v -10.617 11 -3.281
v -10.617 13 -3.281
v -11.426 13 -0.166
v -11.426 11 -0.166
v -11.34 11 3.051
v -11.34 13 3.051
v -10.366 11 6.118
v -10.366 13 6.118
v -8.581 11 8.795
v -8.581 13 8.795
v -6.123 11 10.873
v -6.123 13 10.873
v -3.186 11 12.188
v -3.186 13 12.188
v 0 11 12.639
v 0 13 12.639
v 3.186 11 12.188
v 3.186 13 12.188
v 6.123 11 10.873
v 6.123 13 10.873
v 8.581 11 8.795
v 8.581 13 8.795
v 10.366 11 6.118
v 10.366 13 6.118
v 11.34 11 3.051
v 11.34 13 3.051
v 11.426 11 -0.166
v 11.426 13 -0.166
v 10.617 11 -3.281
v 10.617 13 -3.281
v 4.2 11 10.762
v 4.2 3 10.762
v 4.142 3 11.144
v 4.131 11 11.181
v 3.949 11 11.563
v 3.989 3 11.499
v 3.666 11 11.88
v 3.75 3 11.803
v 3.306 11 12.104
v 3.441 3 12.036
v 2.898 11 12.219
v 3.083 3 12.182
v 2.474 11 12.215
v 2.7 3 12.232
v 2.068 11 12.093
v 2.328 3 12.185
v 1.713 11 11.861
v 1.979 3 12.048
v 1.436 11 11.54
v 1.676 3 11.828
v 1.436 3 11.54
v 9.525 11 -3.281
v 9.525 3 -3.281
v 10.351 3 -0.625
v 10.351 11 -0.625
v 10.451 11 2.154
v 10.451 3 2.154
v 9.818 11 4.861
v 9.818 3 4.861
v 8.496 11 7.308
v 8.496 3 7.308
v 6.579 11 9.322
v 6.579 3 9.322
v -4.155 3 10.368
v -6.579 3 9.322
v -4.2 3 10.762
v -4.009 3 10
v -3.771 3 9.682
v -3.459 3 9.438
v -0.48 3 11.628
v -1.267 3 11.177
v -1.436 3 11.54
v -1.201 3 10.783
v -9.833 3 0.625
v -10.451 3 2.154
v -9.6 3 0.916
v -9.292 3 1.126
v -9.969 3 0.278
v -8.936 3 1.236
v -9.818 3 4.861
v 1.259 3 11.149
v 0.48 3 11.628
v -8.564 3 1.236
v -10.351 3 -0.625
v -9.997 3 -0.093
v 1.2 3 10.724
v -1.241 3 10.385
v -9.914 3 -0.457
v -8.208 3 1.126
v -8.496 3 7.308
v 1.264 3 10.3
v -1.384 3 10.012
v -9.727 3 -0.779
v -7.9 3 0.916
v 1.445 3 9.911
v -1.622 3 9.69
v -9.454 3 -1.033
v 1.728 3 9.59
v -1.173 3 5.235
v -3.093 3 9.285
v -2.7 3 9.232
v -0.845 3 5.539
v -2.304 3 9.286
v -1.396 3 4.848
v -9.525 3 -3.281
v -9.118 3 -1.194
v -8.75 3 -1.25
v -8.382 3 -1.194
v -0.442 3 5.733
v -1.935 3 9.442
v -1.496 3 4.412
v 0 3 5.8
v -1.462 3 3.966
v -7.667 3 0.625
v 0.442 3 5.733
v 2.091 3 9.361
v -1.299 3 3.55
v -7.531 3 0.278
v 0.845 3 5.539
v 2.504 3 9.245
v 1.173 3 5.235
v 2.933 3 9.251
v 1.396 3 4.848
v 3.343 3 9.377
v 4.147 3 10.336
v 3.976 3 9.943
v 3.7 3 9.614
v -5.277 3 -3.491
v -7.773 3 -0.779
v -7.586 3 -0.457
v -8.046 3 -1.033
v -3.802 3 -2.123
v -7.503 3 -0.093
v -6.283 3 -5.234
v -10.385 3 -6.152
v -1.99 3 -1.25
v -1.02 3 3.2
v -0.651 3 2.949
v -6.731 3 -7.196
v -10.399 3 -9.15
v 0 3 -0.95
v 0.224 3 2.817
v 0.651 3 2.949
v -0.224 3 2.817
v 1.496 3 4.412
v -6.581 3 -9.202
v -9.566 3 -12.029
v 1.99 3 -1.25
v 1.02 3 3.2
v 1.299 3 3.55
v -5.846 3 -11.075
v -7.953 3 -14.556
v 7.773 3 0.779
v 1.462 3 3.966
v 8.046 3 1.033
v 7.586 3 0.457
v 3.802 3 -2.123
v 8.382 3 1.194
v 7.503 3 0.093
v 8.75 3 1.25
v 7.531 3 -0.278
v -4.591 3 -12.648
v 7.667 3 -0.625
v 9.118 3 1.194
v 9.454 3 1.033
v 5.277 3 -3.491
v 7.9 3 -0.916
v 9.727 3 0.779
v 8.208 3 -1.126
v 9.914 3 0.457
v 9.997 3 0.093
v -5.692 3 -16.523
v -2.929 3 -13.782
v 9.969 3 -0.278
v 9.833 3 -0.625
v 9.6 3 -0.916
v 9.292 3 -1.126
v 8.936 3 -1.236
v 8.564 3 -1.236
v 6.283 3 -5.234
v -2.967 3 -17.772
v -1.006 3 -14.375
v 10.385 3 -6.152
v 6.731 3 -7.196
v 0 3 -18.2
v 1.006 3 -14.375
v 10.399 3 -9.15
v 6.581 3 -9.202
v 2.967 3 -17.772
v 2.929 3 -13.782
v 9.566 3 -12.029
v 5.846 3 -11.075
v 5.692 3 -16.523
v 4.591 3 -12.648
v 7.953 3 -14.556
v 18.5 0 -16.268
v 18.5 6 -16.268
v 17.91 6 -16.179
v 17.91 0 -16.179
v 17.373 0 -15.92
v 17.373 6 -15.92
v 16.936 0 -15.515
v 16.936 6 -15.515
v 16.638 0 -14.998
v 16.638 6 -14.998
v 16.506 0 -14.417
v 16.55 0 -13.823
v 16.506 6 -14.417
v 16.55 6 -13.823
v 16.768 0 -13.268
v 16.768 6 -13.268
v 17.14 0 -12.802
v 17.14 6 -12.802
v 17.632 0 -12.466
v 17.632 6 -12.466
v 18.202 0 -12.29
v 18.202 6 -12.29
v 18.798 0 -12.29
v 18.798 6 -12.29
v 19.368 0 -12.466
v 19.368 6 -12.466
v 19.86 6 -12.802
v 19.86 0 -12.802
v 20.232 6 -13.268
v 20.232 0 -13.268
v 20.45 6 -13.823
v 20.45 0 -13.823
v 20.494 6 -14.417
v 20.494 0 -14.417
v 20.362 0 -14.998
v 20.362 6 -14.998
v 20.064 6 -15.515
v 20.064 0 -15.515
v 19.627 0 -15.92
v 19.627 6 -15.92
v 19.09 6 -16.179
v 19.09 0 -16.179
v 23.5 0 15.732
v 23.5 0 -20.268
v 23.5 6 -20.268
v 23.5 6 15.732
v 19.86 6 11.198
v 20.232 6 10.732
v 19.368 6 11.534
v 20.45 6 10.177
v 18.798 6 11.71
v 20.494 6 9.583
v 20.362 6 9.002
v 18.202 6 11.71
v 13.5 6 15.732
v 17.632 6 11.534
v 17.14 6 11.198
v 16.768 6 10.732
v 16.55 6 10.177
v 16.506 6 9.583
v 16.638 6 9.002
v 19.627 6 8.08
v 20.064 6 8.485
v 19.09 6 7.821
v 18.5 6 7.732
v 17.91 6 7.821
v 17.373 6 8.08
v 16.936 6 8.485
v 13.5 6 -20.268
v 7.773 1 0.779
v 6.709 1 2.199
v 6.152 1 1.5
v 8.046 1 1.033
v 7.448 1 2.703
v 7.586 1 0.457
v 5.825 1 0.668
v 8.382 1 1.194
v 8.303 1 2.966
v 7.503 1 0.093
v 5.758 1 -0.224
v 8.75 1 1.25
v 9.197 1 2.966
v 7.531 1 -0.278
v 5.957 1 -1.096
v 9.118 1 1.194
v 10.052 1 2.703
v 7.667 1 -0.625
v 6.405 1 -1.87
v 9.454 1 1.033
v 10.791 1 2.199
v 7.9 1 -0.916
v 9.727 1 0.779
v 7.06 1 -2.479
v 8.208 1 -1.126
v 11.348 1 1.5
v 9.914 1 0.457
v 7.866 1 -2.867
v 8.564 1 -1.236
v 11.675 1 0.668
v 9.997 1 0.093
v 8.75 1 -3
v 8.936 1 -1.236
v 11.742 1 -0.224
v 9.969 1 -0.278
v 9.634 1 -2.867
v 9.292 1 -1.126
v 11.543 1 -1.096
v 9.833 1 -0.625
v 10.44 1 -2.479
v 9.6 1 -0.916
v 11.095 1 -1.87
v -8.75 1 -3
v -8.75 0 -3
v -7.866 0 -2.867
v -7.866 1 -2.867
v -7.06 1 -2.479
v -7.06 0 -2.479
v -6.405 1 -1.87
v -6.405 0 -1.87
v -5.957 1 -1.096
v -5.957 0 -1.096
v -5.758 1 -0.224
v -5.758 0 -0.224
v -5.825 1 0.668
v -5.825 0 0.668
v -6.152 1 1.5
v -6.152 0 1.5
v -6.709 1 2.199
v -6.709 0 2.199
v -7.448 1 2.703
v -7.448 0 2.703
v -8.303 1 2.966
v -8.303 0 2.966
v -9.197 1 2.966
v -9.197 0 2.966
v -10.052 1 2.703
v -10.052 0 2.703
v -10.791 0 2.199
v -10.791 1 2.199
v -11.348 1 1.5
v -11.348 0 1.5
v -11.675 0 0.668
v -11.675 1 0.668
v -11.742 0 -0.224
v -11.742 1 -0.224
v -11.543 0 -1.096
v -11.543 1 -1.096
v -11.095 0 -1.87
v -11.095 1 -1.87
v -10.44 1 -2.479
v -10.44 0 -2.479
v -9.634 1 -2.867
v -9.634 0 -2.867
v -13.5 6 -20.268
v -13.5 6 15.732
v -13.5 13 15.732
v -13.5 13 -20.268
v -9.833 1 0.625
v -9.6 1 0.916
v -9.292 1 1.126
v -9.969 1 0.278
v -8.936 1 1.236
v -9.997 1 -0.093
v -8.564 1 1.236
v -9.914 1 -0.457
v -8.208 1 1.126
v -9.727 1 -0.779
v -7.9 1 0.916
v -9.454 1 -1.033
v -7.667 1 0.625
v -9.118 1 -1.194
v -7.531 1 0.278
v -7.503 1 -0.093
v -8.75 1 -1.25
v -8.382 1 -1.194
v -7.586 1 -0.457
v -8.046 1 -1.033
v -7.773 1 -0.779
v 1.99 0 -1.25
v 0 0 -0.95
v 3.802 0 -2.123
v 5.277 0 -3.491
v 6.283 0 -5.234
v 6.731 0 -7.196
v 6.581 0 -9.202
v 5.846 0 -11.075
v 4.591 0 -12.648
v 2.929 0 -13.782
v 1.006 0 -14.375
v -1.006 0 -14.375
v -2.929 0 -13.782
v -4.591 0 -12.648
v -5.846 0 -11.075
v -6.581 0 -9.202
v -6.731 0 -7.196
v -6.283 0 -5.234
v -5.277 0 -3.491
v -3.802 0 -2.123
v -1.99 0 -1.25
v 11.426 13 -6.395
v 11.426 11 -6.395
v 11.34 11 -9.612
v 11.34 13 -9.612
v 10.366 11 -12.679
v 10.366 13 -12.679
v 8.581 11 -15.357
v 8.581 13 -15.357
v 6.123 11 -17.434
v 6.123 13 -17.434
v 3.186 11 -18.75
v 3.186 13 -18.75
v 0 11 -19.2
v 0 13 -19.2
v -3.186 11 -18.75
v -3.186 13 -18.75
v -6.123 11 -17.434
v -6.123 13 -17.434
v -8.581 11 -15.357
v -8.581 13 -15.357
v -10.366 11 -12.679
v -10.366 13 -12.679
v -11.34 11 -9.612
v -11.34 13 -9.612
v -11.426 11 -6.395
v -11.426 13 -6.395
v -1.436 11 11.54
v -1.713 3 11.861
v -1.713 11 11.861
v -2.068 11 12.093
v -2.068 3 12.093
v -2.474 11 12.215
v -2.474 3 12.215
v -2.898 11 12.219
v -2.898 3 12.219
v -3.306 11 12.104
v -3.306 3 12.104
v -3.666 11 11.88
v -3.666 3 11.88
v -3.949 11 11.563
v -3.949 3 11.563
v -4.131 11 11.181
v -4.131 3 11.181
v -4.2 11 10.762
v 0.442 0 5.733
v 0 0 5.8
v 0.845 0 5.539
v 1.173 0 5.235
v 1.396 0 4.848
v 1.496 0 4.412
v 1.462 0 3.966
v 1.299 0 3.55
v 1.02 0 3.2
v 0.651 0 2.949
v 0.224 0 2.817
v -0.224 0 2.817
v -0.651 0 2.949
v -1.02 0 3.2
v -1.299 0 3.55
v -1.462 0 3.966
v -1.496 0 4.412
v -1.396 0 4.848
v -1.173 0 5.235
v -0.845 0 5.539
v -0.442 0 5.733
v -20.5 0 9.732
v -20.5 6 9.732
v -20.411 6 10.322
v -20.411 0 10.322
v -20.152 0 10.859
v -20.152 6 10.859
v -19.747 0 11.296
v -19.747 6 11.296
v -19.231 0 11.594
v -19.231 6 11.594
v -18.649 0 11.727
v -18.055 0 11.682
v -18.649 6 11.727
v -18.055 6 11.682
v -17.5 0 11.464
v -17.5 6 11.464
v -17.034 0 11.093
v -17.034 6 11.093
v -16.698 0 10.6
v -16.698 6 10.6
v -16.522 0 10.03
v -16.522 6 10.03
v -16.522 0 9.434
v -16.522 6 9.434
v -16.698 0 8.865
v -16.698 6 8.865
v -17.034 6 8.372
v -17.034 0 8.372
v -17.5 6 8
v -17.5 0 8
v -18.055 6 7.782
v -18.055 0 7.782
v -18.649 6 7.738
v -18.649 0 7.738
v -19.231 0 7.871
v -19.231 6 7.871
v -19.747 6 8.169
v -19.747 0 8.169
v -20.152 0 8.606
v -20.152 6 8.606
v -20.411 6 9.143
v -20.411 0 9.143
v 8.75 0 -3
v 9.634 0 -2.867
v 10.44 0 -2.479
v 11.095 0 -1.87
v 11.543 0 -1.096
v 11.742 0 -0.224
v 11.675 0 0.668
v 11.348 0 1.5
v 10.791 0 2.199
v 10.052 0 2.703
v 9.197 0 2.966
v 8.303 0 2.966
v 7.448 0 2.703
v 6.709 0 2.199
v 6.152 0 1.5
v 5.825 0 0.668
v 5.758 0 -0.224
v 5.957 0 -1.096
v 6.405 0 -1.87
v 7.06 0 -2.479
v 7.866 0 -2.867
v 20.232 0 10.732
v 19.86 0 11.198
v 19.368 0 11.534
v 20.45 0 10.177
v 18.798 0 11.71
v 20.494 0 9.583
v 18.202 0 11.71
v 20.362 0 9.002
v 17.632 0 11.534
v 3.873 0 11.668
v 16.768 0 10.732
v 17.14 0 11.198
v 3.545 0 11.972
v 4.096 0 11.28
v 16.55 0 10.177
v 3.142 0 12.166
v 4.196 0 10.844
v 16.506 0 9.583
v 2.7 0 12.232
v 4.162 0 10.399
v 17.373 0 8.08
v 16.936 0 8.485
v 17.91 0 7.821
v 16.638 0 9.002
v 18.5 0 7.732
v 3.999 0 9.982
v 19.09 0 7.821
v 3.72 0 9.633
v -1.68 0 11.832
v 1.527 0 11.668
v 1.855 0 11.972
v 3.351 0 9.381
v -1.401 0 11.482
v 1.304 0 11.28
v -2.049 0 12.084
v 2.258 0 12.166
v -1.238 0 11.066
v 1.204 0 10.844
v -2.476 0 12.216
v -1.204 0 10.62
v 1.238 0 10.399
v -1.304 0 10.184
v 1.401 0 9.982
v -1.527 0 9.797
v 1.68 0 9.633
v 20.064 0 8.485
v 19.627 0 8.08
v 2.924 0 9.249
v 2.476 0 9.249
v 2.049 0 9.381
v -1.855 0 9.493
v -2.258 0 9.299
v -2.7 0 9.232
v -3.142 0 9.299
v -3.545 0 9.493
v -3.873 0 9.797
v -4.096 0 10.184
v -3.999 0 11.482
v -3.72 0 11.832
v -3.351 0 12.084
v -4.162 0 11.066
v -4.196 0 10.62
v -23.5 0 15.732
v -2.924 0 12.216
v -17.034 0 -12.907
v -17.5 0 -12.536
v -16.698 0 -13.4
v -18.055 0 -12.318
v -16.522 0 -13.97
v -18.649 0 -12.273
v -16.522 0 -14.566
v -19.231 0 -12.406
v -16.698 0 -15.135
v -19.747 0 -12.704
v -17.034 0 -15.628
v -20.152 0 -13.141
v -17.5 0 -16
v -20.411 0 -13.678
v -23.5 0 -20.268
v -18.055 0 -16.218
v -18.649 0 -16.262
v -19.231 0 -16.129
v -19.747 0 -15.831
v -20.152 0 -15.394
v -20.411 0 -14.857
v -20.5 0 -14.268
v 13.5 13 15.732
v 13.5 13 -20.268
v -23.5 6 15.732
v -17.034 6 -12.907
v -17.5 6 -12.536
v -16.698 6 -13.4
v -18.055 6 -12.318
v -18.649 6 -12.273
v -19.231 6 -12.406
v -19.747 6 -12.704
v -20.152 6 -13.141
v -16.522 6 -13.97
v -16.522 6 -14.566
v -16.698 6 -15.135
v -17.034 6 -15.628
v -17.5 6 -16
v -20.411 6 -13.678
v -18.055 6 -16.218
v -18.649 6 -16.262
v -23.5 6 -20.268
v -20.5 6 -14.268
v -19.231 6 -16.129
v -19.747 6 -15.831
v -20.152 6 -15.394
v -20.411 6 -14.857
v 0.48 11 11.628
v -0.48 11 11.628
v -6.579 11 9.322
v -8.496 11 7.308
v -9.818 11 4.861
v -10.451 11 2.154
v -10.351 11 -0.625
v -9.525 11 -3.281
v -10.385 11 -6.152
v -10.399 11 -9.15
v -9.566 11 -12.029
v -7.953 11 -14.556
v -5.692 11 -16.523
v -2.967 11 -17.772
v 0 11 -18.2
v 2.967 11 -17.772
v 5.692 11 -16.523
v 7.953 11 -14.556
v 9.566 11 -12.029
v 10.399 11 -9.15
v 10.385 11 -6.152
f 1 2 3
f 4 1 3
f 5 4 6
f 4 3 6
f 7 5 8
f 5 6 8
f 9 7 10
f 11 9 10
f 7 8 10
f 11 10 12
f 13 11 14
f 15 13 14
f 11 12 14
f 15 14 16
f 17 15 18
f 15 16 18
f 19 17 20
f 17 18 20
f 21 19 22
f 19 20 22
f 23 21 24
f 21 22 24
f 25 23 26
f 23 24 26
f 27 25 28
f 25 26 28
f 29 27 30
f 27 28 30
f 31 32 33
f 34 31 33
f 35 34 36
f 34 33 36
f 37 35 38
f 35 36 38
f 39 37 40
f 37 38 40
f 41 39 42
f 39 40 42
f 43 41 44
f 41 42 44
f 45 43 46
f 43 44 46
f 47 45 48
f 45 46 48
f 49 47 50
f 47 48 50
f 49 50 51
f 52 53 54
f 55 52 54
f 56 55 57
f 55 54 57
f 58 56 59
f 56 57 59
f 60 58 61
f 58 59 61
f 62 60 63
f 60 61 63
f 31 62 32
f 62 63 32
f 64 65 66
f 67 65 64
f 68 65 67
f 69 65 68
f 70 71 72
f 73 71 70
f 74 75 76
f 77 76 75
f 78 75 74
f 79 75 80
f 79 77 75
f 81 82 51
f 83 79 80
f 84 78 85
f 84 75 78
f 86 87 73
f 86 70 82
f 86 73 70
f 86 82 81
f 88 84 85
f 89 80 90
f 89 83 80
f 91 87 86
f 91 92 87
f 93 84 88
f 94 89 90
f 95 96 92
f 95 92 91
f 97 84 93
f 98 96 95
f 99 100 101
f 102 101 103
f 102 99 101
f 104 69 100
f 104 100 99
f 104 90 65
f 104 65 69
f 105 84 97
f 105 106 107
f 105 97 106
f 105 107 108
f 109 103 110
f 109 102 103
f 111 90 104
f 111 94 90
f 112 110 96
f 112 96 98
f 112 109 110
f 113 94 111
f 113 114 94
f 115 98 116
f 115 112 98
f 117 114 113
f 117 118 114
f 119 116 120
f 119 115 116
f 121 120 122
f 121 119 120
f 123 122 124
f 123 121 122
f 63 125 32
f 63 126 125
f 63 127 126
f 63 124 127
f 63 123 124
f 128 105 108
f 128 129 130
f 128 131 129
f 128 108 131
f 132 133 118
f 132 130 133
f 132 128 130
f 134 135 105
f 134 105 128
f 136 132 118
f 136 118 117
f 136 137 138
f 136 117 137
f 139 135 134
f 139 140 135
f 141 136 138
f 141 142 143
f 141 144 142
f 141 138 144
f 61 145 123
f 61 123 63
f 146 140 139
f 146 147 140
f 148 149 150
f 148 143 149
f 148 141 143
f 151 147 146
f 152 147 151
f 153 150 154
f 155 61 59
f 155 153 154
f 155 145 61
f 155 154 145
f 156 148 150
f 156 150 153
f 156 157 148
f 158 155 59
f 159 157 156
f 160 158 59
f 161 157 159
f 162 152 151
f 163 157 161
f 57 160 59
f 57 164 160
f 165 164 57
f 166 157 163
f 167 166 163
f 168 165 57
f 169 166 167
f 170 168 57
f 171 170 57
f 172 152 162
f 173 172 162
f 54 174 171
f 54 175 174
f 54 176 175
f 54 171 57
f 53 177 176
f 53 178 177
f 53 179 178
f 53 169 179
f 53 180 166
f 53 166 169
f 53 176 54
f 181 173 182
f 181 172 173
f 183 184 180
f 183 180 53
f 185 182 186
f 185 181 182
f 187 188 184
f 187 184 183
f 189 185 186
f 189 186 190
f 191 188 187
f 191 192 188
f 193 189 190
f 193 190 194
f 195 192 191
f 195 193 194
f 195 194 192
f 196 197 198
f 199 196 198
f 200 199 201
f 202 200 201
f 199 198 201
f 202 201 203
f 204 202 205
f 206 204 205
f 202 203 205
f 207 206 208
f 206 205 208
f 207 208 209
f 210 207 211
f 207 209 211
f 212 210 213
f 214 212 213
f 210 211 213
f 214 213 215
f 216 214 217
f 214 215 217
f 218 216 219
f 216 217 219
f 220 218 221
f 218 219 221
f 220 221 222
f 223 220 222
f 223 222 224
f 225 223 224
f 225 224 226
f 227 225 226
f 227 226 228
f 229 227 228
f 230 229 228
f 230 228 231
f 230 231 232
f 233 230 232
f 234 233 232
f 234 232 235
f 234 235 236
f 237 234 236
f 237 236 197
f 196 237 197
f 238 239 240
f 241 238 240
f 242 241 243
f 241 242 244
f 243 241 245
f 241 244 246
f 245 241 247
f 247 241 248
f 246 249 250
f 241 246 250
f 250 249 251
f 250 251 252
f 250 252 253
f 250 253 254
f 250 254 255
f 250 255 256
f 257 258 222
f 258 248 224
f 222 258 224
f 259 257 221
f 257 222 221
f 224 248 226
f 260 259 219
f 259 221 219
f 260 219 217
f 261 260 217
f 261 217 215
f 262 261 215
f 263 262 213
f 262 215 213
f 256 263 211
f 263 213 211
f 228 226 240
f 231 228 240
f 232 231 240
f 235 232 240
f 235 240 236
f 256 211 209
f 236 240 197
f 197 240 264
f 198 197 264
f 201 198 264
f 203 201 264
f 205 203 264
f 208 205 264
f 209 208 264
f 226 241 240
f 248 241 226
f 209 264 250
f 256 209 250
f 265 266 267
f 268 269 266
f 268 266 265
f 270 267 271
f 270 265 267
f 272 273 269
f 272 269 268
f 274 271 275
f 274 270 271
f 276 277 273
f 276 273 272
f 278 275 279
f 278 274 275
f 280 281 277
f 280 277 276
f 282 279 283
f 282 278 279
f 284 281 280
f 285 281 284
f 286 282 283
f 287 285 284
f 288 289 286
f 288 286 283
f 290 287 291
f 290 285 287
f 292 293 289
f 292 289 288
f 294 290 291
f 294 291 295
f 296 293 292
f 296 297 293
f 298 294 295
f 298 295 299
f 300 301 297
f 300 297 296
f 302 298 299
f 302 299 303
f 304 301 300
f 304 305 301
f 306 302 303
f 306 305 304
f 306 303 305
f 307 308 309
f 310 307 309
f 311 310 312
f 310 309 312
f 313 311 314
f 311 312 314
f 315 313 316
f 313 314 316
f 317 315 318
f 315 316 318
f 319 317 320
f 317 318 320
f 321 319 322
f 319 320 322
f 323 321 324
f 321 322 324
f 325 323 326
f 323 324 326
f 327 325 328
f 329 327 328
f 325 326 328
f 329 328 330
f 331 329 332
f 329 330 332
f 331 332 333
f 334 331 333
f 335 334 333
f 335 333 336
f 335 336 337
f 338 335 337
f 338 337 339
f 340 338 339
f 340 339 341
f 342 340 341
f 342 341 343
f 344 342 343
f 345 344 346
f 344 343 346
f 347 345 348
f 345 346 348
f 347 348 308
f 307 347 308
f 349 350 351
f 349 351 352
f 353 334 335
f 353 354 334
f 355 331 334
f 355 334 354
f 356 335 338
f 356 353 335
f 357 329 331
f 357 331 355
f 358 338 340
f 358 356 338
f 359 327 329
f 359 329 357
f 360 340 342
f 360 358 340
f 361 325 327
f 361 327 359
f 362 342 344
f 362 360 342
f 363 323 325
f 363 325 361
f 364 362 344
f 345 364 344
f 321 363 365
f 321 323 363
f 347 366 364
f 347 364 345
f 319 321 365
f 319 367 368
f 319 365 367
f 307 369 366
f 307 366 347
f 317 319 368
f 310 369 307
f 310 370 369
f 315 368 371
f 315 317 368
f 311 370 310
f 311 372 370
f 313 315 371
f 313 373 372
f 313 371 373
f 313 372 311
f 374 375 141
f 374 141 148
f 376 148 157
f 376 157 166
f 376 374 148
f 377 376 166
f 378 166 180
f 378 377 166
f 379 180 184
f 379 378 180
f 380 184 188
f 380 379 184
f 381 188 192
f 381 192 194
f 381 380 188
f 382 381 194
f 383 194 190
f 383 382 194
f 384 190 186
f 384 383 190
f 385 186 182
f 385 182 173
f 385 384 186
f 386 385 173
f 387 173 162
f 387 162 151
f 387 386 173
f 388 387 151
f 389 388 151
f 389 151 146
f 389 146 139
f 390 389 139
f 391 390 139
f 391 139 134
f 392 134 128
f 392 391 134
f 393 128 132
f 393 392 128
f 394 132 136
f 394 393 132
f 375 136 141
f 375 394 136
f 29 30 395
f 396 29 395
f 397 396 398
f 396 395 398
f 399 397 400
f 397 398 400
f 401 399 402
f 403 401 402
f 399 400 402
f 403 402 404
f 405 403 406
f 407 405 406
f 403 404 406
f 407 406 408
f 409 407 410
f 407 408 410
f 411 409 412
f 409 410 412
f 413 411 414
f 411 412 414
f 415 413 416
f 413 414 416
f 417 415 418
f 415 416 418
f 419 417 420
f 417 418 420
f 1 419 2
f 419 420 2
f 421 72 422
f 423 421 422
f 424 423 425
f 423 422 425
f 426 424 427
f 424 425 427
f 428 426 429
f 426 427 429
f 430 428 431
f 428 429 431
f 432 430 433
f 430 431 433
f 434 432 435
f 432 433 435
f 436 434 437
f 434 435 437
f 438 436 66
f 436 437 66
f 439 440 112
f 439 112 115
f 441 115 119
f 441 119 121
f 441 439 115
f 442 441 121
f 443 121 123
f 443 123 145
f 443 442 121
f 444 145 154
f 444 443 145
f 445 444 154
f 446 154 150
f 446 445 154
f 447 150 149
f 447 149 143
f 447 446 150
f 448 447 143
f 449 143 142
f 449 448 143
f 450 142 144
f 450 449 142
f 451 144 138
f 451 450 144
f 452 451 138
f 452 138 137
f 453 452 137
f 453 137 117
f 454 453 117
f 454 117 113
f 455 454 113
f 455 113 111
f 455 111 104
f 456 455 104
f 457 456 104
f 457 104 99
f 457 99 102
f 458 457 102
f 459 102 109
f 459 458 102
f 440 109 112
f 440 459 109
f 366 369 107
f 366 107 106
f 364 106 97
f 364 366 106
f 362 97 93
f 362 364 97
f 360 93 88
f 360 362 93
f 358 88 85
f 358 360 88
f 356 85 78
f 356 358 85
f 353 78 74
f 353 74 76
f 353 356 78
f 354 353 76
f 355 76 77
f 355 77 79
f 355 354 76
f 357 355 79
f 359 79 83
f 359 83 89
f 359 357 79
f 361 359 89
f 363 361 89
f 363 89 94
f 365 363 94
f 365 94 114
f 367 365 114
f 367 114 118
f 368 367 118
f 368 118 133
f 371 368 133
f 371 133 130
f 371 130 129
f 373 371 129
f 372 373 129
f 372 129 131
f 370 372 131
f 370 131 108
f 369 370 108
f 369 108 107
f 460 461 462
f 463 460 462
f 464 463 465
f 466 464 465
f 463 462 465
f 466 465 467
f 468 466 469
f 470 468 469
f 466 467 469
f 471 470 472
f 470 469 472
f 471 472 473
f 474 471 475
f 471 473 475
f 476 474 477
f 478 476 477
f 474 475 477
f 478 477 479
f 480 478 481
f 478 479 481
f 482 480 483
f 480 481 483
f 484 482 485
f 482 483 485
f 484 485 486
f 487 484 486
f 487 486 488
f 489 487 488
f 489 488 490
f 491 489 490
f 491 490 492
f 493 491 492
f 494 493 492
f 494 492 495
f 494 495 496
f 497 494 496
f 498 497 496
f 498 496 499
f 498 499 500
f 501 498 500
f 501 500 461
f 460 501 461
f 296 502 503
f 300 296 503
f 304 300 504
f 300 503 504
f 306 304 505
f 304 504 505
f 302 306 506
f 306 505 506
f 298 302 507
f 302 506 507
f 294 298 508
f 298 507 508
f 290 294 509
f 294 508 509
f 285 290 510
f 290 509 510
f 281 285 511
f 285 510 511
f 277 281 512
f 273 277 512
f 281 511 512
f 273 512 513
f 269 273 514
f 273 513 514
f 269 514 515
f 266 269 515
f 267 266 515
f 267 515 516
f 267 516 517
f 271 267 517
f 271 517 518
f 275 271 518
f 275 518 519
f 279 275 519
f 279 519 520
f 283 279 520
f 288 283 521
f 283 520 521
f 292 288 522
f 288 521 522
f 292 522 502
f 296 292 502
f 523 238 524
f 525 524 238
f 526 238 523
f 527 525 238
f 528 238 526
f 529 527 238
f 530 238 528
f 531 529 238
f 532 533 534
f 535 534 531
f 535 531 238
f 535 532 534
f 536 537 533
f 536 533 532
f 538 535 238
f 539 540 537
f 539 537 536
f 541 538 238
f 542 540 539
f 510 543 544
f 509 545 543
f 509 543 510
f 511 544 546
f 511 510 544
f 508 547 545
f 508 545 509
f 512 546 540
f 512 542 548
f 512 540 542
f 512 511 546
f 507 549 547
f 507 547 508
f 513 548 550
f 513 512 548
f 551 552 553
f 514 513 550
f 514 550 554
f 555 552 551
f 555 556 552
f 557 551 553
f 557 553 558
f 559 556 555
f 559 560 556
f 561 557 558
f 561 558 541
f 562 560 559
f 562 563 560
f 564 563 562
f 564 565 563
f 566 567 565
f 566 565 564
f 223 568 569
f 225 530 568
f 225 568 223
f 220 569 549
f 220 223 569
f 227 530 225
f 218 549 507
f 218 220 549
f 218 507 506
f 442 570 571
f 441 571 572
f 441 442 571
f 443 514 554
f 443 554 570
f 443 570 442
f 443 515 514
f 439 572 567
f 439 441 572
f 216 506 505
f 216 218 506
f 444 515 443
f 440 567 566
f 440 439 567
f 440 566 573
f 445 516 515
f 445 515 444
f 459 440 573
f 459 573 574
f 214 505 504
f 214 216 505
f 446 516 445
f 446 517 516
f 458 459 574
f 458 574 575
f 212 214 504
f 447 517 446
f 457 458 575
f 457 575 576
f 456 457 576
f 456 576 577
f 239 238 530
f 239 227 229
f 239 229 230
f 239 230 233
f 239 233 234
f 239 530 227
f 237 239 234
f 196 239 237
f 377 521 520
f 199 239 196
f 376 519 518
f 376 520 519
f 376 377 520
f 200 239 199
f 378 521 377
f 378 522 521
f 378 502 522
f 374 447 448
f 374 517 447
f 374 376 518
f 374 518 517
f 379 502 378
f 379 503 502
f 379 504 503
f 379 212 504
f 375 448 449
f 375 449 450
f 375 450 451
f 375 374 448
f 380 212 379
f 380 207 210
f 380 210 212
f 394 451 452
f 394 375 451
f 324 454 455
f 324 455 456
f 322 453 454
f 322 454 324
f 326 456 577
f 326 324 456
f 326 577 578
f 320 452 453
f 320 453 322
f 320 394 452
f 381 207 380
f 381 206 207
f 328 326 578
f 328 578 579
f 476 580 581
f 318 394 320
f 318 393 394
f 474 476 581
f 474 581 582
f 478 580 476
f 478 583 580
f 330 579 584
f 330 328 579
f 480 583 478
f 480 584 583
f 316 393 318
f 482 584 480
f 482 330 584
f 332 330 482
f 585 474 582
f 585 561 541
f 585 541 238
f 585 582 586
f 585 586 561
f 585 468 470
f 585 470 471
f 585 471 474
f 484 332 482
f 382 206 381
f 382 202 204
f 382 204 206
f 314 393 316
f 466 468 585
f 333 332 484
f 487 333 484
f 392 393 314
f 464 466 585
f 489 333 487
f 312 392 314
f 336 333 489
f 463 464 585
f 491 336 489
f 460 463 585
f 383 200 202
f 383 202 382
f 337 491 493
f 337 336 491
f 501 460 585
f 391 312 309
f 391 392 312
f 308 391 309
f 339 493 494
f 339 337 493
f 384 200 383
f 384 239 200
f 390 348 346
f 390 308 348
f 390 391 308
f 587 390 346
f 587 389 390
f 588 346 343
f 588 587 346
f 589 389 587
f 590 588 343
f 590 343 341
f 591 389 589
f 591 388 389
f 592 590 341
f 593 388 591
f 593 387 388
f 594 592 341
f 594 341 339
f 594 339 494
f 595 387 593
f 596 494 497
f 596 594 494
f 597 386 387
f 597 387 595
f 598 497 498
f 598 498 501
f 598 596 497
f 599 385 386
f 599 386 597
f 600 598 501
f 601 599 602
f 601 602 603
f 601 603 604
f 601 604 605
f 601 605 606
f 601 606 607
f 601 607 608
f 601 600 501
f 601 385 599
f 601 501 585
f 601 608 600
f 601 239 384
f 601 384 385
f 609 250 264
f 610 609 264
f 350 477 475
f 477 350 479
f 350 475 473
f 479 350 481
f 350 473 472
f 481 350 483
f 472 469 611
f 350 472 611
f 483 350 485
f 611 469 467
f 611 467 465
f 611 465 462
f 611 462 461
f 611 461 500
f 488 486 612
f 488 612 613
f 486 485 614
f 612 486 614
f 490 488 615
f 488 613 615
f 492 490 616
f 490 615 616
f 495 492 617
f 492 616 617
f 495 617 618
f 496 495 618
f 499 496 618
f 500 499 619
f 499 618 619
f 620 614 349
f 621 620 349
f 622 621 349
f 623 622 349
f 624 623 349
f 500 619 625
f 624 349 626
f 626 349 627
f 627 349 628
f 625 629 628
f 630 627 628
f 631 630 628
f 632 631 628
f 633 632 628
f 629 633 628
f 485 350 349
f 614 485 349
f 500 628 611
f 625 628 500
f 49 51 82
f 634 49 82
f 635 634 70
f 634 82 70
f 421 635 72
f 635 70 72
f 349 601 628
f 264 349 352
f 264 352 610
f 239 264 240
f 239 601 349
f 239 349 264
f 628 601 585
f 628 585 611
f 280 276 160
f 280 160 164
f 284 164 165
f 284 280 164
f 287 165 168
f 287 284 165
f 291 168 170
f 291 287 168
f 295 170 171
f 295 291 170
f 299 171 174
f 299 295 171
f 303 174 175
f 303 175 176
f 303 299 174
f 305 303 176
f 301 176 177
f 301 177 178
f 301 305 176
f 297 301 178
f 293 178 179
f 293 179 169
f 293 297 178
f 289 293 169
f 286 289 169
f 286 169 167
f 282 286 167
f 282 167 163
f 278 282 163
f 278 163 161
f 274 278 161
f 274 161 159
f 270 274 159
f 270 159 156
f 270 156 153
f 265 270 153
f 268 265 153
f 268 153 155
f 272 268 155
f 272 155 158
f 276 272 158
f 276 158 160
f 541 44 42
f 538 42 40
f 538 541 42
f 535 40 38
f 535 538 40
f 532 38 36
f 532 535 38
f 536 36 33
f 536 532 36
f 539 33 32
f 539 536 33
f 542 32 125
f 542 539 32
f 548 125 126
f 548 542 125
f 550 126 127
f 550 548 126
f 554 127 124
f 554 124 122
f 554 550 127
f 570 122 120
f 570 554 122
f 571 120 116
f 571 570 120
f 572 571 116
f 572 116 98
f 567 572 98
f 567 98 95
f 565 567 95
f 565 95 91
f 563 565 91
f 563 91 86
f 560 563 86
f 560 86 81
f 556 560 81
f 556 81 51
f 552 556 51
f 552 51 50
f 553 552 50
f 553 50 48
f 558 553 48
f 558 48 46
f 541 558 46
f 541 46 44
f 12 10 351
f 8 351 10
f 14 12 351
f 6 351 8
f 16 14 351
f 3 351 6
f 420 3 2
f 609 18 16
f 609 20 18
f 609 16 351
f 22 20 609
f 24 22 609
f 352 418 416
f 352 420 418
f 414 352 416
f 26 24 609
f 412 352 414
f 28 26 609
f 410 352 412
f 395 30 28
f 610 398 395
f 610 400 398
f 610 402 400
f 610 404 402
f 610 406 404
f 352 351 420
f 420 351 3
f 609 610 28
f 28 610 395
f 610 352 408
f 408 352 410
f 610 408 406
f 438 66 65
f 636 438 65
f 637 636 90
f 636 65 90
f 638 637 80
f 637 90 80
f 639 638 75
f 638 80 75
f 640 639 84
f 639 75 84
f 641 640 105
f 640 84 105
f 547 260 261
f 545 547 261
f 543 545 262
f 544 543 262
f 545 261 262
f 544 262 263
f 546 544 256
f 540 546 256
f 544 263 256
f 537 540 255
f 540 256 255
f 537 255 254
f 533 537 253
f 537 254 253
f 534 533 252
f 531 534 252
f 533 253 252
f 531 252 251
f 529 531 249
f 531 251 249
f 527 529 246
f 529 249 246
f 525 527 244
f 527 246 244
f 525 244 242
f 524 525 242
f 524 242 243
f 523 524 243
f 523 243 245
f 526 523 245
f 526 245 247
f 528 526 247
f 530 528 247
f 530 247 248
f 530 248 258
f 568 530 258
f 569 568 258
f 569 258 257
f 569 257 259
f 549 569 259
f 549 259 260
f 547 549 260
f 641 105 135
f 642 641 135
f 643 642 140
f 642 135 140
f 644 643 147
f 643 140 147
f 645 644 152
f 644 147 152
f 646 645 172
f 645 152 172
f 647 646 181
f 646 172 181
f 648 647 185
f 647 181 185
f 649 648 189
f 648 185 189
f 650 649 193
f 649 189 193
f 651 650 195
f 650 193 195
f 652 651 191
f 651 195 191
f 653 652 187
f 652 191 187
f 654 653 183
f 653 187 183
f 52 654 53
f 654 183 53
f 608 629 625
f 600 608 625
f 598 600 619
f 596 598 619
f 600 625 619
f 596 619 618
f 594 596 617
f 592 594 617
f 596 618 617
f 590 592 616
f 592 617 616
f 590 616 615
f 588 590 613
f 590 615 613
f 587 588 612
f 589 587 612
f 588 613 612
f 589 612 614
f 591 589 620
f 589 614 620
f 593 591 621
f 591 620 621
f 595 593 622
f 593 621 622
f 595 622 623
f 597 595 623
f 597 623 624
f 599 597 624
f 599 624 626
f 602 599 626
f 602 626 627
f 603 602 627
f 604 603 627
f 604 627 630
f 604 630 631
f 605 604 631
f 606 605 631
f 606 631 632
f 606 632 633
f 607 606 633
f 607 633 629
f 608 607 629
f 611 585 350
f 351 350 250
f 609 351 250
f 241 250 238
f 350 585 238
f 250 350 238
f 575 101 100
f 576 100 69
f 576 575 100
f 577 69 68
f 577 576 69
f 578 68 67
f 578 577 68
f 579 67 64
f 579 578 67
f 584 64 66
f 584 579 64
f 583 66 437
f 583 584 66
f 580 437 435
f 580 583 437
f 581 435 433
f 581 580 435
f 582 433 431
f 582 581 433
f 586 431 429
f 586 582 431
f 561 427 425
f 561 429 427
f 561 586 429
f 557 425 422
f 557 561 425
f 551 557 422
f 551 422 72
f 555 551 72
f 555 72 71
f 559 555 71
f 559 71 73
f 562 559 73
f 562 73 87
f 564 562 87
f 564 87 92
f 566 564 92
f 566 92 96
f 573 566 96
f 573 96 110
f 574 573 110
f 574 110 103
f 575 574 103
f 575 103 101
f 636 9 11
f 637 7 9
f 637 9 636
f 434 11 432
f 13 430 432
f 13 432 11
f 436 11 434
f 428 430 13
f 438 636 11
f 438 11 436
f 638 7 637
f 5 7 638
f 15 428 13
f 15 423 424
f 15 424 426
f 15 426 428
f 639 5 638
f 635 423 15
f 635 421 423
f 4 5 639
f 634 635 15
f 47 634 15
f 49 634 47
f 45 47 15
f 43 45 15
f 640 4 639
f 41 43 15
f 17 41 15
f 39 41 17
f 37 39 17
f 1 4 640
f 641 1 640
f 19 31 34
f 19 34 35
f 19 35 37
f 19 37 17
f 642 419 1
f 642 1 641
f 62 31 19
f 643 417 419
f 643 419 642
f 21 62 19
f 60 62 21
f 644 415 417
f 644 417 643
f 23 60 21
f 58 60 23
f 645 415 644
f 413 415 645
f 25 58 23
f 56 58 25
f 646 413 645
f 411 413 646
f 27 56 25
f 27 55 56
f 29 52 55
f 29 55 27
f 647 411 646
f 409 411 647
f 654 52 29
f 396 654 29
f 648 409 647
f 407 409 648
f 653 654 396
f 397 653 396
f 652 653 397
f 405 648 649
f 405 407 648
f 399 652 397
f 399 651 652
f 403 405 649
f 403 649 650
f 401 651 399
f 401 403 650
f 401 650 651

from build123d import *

# Parameters (mm, degrees)
SKETCH_1_W          = 27
SKETCH_1_H          = 36
SKETCH_1_R          = 6.75
SKETCH_1_R_2        = 1.5
SKETCH_1_R_3        = 1.25
EXTRUDE_1_DEPTH     = 3
SKETCH_4_W          = 10
SKETCH_4_H          = 6
EXTRUDE_3_DEPTH     = 36
SKETCH_6_R          = 3
CUT_EXTRUDE_3_DEPTH = 1
EXTRUDE_4_OUTLINE_W = 27
EXTRUDE_4_OUTLINE_H = 36
EXTRUDE_4_DEPTH     = 10
CUT_EXTRUDE_START   = 10
CUT_EXTRUDE_5_DEPTH = 2
SKETCH_13_R         = 2
CUT_EXTRUDE_6_DEPTH = 10


# Read off the part's stored shape, not the designer's step: 凸台-拉伸4
with BuildPart() as part:
    # 草图1 → 凸台-拉伸1 (new body)
    with BuildSketch(Plane(origin=(0, 0, 0), x_dir=(1, 0, 0), z_dir=(0, 1, 0))):
        with Locations((0, 2.267700118)):
            Rectangle(SKETCH_1_W, SKETCH_1_H)
        with Locations(Location((0, 7.7, 0), (0, 0, 270))):
            Circle(SKETCH_1_R, mode=Mode.SUBTRACT)
        with Locations(Location((0, -4.3, 0), (0, 0, 270))):
            Circle(SKETCH_1_R_2, mode=Mode.SUBTRACT)
        with Locations(Location((-8.75, 0, 0), (0, 0, 90))):
            Circle(SKETCH_1_R_3, mode=Mode.SUBTRACT)
        with Locations(Location((-2.7, -10.732299882, 0), (0, 0, 90))):
            Circle(SKETCH_1_R_2, mode=Mode.SUBTRACT)
        with Locations(Location((8.75, 0, 0), (0, 0, 270))):
            Circle(SKETCH_1_R_3, mode=Mode.SUBTRACT)
        with Locations(Location((2.7, -10.732299882, 0), (0, 0, 270))):
            Circle(SKETCH_1_R_2, mode=Mode.SUBTRACT)
    extrude(amount=EXTRUDE_1_DEPTH)

    # 草图4 → 凸台-拉伸3 (add)
    with BuildSketch(Plane(origin=(0, 0, -20.267700118), x_dir=(-1, 0, 0), z_dir=(0, 0, -1))):
        with Locations((-18.5, 3)):
            Rectangle(SKETCH_4_W, SKETCH_4_H)
        with Locations((18.5, 3)):
            Rectangle(SKETCH_4_W, SKETCH_4_H)
    extrude(amount=-EXTRUDE_3_DEPTH)

    # 草图6 → 切除-拉伸3 (cut)
    with BuildSketch(Plane.XZ):
        with Locations(Location((-8.75, 0, 0), (0, 0, 270))):
            Circle(SKETCH_6_R)
        with Locations(Location((8.75, 0, 0), (0, 0, 270))):
            Circle(SKETCH_6_R)
    extrude(amount=-CUT_EXTRUDE_3_DEPTH, mode=Mode.SUBTRACT)

    # 凸台-拉伸4 outline → 凸台-拉伸4 (add)
    with BuildSketch(Plane(origin=(0, 3, 0), x_dir=(1, 0, 0), z_dir=(0, 1, 0))):
        with Locations((0, 2.267700118)):
            Rectangle(EXTRUDE_4_OUTLINE_W, EXTRUDE_4_OUTLINE_H)
        with BuildLine():
            ThreePointArc((-1.435964828, -11.539898225), (-3.106363606, -12.176207296), (-4.199704154, -10.762089989))
            ThreePointArc((-4.199704154, -10.762089989), (-9.817841219, -4.861453177), (-9.52470472, 3.280724041))
            ThreePointArc((-9.52470472, 3.280724041), (0, 18.2), (9.52470472, 3.280724041))
            ThreePointArc((9.52470472, 3.280724041), (9.817841219, -4.861453177), (4.199704154, -10.762089989))
            ThreePointArc((4.199704154, -10.762089989), (3.106363606, -12.176207296), (1.435964828, -11.539898225))
            ThreePointArc((1.435964828, -11.539898225), (0, -11.638551918), (-1.435964828, -11.539898225))
        make_face(mode=Mode.SUBTRACT)
    extrude(amount=EXTRUDE_4_DEPTH)

    # 草图9 → 切除-拉伸5 (cut)
    with BuildSketch(Plane(origin=(0, 3, 0), x_dir=(1, 0, 0), z_dir=(0, 1, 0)).offset(CUT_EXTRUDE_START)):
        with BuildLine():
            ThreePointArc((10.616967552, 3.280724041), (0, 19.2), (-10.616967552, 3.280724041))
            ThreePointArc((-10.616967552, 3.280724041), (0, -12.638551918), (10.616967552, 3.280724041))
        make_face()
    extrude(amount=-CUT_EXTRUDE_5_DEPTH, mode=Mode.SUBTRACT)

    # 草图13 → 切除-拉伸6 (cut)
    with BuildSketch(Plane(origin=(0, 6, 0), x_dir=(1, 0, 0), z_dir=(0, 1, 0))):
        with Locations(Location((-18.5, 14.267700118, 0), (0, 0, 180))):
            Circle(SKETCH_13_R)
        with Locations(Location((-18.5, -9.732299882, 0), (0, 0, 180))):
            Circle(SKETCH_13_R)
        with Locations(Location((18.5, -9.732299882, 0), (0, 0, 90))):
            Circle(SKETCH_13_R)
        with Locations(Location((18.5, 14.267700118, 0), (0, 0, 90))):
            Circle(SKETCH_13_R)
    extrude(amount=-CUT_EXTRUDE_6_DEPTH, mode=Mode.SUBTRACT)


solid = part.part
